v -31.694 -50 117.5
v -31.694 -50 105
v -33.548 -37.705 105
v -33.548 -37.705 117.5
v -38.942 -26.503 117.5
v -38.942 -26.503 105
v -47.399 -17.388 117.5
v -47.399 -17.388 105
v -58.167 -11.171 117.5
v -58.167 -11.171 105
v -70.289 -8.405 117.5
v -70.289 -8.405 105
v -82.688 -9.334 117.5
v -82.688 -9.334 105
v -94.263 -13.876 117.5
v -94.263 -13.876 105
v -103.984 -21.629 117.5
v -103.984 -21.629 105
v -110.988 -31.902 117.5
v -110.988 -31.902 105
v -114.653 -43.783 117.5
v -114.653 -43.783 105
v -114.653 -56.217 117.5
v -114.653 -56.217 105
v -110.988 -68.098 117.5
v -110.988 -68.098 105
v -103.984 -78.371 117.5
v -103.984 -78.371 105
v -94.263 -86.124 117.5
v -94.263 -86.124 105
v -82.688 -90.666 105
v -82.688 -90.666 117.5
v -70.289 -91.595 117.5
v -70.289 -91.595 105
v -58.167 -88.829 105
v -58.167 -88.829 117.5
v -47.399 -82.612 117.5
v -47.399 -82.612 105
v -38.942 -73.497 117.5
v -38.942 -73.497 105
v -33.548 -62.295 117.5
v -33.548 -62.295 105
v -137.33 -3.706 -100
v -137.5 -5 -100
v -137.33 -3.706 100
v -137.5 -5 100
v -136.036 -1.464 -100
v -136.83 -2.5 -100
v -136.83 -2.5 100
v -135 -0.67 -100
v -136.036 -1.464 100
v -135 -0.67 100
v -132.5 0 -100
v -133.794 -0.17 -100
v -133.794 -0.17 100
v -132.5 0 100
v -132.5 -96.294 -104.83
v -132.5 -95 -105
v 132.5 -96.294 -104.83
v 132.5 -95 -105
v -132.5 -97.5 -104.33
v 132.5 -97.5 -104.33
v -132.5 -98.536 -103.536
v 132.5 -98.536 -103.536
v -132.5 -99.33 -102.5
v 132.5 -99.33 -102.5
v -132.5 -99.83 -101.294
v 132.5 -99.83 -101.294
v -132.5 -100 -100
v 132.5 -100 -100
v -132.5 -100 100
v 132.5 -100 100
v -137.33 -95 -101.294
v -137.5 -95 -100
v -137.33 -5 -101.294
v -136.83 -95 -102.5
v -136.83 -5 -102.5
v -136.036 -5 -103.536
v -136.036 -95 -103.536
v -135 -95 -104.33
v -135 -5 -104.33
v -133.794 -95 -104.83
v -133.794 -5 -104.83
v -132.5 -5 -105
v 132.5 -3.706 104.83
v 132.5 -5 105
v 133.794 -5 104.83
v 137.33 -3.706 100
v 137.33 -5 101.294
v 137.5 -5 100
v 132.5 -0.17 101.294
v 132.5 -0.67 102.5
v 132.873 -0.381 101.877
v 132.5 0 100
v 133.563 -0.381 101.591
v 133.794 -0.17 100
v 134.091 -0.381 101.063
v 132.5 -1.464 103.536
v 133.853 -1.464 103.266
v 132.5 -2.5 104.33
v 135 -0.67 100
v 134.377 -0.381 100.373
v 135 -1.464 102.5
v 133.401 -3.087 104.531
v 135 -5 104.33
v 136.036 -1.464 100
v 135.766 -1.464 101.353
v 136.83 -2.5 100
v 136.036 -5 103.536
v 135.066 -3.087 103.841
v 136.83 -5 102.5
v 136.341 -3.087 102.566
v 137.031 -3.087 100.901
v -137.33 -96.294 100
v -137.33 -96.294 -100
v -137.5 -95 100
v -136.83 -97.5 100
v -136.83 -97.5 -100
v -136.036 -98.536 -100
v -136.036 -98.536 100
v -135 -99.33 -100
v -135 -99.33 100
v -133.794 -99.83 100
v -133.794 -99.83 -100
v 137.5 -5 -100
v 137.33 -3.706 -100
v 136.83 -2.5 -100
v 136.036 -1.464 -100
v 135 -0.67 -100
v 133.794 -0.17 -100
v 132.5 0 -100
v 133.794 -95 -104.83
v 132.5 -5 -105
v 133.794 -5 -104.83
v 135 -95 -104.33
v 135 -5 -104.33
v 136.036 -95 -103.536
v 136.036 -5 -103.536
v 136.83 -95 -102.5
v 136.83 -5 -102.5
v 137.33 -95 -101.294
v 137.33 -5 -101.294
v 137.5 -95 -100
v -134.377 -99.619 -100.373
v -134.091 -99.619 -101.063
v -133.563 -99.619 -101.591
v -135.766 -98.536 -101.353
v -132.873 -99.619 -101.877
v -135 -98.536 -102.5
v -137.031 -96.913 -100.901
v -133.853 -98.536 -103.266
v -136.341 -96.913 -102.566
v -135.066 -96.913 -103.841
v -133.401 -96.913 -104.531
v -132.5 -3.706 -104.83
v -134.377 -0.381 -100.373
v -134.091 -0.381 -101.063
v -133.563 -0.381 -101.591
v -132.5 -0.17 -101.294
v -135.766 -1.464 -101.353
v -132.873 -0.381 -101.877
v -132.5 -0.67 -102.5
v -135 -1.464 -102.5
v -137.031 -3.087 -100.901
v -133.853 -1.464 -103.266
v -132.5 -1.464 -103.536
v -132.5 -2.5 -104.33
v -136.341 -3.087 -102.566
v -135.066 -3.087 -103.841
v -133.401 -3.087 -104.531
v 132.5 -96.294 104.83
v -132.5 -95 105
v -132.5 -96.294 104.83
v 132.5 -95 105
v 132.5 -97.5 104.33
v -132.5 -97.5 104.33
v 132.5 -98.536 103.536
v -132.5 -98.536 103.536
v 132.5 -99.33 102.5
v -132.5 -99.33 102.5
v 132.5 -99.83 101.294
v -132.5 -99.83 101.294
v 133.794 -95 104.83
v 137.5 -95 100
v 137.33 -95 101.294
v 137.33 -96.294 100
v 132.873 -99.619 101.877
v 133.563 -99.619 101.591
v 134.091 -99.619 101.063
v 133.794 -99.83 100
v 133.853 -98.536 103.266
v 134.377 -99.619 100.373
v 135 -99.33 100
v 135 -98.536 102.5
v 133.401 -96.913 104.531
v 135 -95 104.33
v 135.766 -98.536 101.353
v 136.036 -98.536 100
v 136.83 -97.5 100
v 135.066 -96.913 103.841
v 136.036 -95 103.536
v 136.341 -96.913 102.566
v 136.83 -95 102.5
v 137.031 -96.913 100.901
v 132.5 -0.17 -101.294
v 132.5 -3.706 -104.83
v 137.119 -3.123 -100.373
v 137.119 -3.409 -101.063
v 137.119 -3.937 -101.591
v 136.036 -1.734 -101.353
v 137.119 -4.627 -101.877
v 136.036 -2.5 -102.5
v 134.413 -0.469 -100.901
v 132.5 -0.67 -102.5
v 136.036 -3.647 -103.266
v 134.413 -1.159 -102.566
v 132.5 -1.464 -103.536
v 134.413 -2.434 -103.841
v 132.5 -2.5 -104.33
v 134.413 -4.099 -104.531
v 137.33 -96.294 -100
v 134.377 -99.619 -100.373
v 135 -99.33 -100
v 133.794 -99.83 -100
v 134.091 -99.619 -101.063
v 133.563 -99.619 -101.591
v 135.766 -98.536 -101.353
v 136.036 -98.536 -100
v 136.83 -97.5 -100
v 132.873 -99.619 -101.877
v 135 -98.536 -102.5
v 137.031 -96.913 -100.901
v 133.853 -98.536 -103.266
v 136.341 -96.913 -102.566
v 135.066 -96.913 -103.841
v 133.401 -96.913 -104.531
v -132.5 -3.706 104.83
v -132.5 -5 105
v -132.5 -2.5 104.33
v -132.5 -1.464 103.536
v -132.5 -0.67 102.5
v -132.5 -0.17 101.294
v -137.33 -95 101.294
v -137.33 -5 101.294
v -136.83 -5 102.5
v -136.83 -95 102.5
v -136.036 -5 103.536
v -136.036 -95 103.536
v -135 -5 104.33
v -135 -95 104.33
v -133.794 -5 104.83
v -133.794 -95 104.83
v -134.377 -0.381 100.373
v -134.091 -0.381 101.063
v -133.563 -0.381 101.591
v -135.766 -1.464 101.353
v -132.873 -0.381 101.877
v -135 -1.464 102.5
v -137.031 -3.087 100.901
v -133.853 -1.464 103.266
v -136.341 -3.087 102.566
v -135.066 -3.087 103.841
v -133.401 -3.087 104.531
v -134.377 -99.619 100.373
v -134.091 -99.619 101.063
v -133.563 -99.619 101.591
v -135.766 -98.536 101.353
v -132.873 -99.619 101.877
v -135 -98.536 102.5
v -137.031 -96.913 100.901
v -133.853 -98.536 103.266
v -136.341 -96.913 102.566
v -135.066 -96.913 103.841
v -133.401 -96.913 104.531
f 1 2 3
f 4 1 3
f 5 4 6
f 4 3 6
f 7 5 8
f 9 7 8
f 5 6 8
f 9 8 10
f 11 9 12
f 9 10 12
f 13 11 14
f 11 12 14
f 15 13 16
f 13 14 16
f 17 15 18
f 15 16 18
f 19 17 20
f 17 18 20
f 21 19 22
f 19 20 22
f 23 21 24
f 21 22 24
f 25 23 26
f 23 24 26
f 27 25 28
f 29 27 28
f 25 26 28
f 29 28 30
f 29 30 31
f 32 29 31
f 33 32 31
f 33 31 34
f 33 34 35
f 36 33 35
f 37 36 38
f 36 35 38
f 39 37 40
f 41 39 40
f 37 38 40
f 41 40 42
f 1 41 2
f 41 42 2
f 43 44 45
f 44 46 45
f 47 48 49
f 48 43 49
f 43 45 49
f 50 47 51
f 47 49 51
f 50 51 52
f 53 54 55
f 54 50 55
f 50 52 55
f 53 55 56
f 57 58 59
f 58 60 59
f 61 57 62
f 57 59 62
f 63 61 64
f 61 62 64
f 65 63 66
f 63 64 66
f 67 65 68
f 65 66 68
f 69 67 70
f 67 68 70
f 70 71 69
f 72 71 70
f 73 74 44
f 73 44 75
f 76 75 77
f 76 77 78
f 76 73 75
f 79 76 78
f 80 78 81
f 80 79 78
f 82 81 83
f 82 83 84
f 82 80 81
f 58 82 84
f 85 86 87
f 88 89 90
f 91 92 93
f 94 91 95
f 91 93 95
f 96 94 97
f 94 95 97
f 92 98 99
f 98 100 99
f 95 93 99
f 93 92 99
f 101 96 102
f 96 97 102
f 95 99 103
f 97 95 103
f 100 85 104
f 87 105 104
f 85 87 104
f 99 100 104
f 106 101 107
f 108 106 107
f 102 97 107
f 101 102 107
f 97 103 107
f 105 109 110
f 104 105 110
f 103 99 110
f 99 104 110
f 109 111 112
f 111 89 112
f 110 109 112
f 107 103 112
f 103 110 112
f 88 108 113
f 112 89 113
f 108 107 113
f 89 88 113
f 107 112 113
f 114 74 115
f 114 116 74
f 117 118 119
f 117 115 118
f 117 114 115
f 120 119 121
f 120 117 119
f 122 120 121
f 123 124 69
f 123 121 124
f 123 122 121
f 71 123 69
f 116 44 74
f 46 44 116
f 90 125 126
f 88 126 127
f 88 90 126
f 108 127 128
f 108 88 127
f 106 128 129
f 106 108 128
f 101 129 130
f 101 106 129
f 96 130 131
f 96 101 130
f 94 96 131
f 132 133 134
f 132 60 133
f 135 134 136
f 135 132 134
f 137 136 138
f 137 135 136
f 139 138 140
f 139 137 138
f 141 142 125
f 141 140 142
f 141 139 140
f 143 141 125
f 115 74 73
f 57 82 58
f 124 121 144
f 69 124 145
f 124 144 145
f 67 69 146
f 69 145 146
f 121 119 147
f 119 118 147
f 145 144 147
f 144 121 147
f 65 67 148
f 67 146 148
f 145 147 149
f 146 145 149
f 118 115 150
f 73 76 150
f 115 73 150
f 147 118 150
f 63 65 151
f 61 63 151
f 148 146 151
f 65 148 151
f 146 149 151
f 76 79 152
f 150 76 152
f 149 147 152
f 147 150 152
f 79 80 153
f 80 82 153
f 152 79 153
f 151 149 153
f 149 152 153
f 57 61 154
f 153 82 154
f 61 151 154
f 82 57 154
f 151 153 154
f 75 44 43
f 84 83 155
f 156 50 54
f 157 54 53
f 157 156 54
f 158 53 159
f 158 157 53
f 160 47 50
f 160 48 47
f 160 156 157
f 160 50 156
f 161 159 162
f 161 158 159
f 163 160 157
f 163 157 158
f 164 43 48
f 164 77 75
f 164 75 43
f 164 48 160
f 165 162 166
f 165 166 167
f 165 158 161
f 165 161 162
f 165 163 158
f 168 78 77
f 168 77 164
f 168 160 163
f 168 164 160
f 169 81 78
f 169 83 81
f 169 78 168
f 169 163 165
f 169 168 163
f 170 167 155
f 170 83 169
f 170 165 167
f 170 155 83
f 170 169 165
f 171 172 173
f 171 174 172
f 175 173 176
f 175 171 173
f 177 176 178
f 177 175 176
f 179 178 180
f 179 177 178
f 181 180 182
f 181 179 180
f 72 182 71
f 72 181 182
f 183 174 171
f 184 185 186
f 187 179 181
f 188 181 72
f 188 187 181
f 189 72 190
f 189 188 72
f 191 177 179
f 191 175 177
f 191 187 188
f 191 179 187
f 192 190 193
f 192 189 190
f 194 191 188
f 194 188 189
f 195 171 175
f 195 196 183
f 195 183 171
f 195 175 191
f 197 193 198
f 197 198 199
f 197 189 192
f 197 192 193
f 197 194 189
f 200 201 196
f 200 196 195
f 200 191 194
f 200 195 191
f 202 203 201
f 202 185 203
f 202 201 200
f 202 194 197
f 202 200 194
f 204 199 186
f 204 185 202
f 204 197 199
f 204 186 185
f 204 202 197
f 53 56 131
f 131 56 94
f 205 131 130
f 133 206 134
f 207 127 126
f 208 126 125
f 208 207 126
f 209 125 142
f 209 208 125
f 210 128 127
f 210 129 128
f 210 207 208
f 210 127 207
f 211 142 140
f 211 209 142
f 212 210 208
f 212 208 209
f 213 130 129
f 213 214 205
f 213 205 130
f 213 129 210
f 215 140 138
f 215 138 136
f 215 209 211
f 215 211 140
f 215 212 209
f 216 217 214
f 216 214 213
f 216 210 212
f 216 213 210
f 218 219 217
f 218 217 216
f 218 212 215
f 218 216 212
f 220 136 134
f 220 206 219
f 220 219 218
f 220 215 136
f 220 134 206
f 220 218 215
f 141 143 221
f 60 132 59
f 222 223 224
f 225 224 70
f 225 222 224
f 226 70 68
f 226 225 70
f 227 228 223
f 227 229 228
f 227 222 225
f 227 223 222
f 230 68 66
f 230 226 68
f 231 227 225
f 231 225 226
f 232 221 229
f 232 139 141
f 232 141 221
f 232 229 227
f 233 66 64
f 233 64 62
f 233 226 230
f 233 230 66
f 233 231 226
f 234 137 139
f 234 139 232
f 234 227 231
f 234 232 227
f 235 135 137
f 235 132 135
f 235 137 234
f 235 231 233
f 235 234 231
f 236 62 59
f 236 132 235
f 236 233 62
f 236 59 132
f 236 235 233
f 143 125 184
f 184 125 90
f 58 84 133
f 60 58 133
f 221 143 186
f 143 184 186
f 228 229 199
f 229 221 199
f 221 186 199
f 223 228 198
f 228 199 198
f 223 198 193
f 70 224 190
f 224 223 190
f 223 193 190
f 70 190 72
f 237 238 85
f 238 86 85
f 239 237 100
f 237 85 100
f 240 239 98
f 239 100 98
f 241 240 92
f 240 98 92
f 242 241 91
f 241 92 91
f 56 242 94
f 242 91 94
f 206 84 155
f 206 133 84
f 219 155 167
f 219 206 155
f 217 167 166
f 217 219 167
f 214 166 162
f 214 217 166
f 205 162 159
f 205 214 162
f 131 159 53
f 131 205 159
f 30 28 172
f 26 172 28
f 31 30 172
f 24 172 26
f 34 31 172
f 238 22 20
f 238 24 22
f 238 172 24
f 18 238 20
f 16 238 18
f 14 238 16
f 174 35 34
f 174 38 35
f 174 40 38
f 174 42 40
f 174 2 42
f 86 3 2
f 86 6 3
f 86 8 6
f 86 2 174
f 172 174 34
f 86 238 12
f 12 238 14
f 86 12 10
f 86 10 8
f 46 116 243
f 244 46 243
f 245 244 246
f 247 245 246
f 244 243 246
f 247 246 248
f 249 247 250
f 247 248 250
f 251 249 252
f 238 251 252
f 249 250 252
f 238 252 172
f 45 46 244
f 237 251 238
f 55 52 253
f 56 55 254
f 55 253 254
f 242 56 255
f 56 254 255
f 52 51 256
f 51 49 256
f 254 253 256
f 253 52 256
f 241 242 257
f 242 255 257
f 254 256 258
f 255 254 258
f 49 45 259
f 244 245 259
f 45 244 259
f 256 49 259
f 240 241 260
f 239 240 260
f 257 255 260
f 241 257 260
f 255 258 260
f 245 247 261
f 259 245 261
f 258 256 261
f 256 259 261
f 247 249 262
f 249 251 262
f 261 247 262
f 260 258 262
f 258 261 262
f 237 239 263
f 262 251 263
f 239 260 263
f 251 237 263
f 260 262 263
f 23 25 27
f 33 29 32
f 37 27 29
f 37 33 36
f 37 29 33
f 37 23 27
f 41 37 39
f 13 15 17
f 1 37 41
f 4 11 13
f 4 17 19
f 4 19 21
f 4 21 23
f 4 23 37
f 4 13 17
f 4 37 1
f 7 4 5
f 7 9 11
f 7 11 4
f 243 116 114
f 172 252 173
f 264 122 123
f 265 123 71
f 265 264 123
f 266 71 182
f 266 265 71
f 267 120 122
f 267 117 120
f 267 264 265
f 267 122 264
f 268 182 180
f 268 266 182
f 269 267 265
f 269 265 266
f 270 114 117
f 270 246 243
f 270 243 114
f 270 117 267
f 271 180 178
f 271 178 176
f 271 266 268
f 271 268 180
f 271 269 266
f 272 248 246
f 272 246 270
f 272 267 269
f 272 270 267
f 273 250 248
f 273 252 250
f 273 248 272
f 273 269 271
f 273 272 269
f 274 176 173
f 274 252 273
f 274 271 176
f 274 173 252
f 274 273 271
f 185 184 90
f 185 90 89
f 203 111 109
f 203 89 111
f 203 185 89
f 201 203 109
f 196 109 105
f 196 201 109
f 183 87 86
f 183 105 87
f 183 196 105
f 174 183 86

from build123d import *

# Parameters (mm, degrees)
F0_W     = 275
F0_H     = 210
F1_DEPTH = 100
F2_R     = 5
F3_R     = 41.712108
F4_DEPTH = 12.5


with BuildPart() as f1:
    # F0 (on Front) → F1 (new body)
    with BuildSketch(Plane.XZ):
        Rectangle(F0_W, F0_H)
    extrude(amount=F1_DEPTH)

    # F2
    f2_edges = [f1.edges().sort_by_distance(p)[0] for p in [
        (-137.5, -50, 105),
        (-137.5, -50, -105),
        (-137.5, 0, 0),
        (-137.5, -100, 0),
        (137.5, -50, 105),
        (0, 0, 105),
        (0, -100, 105),
        (0, 0, -105),
        (137.5, 0, 0),
        (137.5, -50, -105),
        (137.5, -100, 0),
        (0, -100, -105),
    ]]
    fillet(f2_edges, radius=F2_R)

    # F3 (on face) → F4 (join)
    with BuildSketch(Plane.XY.offset(105)):
        with Locations((-73.406562, -50)):
            Circle(F3_R)
    extrude(amount=F4_DEPTH)


solid = f1.part
